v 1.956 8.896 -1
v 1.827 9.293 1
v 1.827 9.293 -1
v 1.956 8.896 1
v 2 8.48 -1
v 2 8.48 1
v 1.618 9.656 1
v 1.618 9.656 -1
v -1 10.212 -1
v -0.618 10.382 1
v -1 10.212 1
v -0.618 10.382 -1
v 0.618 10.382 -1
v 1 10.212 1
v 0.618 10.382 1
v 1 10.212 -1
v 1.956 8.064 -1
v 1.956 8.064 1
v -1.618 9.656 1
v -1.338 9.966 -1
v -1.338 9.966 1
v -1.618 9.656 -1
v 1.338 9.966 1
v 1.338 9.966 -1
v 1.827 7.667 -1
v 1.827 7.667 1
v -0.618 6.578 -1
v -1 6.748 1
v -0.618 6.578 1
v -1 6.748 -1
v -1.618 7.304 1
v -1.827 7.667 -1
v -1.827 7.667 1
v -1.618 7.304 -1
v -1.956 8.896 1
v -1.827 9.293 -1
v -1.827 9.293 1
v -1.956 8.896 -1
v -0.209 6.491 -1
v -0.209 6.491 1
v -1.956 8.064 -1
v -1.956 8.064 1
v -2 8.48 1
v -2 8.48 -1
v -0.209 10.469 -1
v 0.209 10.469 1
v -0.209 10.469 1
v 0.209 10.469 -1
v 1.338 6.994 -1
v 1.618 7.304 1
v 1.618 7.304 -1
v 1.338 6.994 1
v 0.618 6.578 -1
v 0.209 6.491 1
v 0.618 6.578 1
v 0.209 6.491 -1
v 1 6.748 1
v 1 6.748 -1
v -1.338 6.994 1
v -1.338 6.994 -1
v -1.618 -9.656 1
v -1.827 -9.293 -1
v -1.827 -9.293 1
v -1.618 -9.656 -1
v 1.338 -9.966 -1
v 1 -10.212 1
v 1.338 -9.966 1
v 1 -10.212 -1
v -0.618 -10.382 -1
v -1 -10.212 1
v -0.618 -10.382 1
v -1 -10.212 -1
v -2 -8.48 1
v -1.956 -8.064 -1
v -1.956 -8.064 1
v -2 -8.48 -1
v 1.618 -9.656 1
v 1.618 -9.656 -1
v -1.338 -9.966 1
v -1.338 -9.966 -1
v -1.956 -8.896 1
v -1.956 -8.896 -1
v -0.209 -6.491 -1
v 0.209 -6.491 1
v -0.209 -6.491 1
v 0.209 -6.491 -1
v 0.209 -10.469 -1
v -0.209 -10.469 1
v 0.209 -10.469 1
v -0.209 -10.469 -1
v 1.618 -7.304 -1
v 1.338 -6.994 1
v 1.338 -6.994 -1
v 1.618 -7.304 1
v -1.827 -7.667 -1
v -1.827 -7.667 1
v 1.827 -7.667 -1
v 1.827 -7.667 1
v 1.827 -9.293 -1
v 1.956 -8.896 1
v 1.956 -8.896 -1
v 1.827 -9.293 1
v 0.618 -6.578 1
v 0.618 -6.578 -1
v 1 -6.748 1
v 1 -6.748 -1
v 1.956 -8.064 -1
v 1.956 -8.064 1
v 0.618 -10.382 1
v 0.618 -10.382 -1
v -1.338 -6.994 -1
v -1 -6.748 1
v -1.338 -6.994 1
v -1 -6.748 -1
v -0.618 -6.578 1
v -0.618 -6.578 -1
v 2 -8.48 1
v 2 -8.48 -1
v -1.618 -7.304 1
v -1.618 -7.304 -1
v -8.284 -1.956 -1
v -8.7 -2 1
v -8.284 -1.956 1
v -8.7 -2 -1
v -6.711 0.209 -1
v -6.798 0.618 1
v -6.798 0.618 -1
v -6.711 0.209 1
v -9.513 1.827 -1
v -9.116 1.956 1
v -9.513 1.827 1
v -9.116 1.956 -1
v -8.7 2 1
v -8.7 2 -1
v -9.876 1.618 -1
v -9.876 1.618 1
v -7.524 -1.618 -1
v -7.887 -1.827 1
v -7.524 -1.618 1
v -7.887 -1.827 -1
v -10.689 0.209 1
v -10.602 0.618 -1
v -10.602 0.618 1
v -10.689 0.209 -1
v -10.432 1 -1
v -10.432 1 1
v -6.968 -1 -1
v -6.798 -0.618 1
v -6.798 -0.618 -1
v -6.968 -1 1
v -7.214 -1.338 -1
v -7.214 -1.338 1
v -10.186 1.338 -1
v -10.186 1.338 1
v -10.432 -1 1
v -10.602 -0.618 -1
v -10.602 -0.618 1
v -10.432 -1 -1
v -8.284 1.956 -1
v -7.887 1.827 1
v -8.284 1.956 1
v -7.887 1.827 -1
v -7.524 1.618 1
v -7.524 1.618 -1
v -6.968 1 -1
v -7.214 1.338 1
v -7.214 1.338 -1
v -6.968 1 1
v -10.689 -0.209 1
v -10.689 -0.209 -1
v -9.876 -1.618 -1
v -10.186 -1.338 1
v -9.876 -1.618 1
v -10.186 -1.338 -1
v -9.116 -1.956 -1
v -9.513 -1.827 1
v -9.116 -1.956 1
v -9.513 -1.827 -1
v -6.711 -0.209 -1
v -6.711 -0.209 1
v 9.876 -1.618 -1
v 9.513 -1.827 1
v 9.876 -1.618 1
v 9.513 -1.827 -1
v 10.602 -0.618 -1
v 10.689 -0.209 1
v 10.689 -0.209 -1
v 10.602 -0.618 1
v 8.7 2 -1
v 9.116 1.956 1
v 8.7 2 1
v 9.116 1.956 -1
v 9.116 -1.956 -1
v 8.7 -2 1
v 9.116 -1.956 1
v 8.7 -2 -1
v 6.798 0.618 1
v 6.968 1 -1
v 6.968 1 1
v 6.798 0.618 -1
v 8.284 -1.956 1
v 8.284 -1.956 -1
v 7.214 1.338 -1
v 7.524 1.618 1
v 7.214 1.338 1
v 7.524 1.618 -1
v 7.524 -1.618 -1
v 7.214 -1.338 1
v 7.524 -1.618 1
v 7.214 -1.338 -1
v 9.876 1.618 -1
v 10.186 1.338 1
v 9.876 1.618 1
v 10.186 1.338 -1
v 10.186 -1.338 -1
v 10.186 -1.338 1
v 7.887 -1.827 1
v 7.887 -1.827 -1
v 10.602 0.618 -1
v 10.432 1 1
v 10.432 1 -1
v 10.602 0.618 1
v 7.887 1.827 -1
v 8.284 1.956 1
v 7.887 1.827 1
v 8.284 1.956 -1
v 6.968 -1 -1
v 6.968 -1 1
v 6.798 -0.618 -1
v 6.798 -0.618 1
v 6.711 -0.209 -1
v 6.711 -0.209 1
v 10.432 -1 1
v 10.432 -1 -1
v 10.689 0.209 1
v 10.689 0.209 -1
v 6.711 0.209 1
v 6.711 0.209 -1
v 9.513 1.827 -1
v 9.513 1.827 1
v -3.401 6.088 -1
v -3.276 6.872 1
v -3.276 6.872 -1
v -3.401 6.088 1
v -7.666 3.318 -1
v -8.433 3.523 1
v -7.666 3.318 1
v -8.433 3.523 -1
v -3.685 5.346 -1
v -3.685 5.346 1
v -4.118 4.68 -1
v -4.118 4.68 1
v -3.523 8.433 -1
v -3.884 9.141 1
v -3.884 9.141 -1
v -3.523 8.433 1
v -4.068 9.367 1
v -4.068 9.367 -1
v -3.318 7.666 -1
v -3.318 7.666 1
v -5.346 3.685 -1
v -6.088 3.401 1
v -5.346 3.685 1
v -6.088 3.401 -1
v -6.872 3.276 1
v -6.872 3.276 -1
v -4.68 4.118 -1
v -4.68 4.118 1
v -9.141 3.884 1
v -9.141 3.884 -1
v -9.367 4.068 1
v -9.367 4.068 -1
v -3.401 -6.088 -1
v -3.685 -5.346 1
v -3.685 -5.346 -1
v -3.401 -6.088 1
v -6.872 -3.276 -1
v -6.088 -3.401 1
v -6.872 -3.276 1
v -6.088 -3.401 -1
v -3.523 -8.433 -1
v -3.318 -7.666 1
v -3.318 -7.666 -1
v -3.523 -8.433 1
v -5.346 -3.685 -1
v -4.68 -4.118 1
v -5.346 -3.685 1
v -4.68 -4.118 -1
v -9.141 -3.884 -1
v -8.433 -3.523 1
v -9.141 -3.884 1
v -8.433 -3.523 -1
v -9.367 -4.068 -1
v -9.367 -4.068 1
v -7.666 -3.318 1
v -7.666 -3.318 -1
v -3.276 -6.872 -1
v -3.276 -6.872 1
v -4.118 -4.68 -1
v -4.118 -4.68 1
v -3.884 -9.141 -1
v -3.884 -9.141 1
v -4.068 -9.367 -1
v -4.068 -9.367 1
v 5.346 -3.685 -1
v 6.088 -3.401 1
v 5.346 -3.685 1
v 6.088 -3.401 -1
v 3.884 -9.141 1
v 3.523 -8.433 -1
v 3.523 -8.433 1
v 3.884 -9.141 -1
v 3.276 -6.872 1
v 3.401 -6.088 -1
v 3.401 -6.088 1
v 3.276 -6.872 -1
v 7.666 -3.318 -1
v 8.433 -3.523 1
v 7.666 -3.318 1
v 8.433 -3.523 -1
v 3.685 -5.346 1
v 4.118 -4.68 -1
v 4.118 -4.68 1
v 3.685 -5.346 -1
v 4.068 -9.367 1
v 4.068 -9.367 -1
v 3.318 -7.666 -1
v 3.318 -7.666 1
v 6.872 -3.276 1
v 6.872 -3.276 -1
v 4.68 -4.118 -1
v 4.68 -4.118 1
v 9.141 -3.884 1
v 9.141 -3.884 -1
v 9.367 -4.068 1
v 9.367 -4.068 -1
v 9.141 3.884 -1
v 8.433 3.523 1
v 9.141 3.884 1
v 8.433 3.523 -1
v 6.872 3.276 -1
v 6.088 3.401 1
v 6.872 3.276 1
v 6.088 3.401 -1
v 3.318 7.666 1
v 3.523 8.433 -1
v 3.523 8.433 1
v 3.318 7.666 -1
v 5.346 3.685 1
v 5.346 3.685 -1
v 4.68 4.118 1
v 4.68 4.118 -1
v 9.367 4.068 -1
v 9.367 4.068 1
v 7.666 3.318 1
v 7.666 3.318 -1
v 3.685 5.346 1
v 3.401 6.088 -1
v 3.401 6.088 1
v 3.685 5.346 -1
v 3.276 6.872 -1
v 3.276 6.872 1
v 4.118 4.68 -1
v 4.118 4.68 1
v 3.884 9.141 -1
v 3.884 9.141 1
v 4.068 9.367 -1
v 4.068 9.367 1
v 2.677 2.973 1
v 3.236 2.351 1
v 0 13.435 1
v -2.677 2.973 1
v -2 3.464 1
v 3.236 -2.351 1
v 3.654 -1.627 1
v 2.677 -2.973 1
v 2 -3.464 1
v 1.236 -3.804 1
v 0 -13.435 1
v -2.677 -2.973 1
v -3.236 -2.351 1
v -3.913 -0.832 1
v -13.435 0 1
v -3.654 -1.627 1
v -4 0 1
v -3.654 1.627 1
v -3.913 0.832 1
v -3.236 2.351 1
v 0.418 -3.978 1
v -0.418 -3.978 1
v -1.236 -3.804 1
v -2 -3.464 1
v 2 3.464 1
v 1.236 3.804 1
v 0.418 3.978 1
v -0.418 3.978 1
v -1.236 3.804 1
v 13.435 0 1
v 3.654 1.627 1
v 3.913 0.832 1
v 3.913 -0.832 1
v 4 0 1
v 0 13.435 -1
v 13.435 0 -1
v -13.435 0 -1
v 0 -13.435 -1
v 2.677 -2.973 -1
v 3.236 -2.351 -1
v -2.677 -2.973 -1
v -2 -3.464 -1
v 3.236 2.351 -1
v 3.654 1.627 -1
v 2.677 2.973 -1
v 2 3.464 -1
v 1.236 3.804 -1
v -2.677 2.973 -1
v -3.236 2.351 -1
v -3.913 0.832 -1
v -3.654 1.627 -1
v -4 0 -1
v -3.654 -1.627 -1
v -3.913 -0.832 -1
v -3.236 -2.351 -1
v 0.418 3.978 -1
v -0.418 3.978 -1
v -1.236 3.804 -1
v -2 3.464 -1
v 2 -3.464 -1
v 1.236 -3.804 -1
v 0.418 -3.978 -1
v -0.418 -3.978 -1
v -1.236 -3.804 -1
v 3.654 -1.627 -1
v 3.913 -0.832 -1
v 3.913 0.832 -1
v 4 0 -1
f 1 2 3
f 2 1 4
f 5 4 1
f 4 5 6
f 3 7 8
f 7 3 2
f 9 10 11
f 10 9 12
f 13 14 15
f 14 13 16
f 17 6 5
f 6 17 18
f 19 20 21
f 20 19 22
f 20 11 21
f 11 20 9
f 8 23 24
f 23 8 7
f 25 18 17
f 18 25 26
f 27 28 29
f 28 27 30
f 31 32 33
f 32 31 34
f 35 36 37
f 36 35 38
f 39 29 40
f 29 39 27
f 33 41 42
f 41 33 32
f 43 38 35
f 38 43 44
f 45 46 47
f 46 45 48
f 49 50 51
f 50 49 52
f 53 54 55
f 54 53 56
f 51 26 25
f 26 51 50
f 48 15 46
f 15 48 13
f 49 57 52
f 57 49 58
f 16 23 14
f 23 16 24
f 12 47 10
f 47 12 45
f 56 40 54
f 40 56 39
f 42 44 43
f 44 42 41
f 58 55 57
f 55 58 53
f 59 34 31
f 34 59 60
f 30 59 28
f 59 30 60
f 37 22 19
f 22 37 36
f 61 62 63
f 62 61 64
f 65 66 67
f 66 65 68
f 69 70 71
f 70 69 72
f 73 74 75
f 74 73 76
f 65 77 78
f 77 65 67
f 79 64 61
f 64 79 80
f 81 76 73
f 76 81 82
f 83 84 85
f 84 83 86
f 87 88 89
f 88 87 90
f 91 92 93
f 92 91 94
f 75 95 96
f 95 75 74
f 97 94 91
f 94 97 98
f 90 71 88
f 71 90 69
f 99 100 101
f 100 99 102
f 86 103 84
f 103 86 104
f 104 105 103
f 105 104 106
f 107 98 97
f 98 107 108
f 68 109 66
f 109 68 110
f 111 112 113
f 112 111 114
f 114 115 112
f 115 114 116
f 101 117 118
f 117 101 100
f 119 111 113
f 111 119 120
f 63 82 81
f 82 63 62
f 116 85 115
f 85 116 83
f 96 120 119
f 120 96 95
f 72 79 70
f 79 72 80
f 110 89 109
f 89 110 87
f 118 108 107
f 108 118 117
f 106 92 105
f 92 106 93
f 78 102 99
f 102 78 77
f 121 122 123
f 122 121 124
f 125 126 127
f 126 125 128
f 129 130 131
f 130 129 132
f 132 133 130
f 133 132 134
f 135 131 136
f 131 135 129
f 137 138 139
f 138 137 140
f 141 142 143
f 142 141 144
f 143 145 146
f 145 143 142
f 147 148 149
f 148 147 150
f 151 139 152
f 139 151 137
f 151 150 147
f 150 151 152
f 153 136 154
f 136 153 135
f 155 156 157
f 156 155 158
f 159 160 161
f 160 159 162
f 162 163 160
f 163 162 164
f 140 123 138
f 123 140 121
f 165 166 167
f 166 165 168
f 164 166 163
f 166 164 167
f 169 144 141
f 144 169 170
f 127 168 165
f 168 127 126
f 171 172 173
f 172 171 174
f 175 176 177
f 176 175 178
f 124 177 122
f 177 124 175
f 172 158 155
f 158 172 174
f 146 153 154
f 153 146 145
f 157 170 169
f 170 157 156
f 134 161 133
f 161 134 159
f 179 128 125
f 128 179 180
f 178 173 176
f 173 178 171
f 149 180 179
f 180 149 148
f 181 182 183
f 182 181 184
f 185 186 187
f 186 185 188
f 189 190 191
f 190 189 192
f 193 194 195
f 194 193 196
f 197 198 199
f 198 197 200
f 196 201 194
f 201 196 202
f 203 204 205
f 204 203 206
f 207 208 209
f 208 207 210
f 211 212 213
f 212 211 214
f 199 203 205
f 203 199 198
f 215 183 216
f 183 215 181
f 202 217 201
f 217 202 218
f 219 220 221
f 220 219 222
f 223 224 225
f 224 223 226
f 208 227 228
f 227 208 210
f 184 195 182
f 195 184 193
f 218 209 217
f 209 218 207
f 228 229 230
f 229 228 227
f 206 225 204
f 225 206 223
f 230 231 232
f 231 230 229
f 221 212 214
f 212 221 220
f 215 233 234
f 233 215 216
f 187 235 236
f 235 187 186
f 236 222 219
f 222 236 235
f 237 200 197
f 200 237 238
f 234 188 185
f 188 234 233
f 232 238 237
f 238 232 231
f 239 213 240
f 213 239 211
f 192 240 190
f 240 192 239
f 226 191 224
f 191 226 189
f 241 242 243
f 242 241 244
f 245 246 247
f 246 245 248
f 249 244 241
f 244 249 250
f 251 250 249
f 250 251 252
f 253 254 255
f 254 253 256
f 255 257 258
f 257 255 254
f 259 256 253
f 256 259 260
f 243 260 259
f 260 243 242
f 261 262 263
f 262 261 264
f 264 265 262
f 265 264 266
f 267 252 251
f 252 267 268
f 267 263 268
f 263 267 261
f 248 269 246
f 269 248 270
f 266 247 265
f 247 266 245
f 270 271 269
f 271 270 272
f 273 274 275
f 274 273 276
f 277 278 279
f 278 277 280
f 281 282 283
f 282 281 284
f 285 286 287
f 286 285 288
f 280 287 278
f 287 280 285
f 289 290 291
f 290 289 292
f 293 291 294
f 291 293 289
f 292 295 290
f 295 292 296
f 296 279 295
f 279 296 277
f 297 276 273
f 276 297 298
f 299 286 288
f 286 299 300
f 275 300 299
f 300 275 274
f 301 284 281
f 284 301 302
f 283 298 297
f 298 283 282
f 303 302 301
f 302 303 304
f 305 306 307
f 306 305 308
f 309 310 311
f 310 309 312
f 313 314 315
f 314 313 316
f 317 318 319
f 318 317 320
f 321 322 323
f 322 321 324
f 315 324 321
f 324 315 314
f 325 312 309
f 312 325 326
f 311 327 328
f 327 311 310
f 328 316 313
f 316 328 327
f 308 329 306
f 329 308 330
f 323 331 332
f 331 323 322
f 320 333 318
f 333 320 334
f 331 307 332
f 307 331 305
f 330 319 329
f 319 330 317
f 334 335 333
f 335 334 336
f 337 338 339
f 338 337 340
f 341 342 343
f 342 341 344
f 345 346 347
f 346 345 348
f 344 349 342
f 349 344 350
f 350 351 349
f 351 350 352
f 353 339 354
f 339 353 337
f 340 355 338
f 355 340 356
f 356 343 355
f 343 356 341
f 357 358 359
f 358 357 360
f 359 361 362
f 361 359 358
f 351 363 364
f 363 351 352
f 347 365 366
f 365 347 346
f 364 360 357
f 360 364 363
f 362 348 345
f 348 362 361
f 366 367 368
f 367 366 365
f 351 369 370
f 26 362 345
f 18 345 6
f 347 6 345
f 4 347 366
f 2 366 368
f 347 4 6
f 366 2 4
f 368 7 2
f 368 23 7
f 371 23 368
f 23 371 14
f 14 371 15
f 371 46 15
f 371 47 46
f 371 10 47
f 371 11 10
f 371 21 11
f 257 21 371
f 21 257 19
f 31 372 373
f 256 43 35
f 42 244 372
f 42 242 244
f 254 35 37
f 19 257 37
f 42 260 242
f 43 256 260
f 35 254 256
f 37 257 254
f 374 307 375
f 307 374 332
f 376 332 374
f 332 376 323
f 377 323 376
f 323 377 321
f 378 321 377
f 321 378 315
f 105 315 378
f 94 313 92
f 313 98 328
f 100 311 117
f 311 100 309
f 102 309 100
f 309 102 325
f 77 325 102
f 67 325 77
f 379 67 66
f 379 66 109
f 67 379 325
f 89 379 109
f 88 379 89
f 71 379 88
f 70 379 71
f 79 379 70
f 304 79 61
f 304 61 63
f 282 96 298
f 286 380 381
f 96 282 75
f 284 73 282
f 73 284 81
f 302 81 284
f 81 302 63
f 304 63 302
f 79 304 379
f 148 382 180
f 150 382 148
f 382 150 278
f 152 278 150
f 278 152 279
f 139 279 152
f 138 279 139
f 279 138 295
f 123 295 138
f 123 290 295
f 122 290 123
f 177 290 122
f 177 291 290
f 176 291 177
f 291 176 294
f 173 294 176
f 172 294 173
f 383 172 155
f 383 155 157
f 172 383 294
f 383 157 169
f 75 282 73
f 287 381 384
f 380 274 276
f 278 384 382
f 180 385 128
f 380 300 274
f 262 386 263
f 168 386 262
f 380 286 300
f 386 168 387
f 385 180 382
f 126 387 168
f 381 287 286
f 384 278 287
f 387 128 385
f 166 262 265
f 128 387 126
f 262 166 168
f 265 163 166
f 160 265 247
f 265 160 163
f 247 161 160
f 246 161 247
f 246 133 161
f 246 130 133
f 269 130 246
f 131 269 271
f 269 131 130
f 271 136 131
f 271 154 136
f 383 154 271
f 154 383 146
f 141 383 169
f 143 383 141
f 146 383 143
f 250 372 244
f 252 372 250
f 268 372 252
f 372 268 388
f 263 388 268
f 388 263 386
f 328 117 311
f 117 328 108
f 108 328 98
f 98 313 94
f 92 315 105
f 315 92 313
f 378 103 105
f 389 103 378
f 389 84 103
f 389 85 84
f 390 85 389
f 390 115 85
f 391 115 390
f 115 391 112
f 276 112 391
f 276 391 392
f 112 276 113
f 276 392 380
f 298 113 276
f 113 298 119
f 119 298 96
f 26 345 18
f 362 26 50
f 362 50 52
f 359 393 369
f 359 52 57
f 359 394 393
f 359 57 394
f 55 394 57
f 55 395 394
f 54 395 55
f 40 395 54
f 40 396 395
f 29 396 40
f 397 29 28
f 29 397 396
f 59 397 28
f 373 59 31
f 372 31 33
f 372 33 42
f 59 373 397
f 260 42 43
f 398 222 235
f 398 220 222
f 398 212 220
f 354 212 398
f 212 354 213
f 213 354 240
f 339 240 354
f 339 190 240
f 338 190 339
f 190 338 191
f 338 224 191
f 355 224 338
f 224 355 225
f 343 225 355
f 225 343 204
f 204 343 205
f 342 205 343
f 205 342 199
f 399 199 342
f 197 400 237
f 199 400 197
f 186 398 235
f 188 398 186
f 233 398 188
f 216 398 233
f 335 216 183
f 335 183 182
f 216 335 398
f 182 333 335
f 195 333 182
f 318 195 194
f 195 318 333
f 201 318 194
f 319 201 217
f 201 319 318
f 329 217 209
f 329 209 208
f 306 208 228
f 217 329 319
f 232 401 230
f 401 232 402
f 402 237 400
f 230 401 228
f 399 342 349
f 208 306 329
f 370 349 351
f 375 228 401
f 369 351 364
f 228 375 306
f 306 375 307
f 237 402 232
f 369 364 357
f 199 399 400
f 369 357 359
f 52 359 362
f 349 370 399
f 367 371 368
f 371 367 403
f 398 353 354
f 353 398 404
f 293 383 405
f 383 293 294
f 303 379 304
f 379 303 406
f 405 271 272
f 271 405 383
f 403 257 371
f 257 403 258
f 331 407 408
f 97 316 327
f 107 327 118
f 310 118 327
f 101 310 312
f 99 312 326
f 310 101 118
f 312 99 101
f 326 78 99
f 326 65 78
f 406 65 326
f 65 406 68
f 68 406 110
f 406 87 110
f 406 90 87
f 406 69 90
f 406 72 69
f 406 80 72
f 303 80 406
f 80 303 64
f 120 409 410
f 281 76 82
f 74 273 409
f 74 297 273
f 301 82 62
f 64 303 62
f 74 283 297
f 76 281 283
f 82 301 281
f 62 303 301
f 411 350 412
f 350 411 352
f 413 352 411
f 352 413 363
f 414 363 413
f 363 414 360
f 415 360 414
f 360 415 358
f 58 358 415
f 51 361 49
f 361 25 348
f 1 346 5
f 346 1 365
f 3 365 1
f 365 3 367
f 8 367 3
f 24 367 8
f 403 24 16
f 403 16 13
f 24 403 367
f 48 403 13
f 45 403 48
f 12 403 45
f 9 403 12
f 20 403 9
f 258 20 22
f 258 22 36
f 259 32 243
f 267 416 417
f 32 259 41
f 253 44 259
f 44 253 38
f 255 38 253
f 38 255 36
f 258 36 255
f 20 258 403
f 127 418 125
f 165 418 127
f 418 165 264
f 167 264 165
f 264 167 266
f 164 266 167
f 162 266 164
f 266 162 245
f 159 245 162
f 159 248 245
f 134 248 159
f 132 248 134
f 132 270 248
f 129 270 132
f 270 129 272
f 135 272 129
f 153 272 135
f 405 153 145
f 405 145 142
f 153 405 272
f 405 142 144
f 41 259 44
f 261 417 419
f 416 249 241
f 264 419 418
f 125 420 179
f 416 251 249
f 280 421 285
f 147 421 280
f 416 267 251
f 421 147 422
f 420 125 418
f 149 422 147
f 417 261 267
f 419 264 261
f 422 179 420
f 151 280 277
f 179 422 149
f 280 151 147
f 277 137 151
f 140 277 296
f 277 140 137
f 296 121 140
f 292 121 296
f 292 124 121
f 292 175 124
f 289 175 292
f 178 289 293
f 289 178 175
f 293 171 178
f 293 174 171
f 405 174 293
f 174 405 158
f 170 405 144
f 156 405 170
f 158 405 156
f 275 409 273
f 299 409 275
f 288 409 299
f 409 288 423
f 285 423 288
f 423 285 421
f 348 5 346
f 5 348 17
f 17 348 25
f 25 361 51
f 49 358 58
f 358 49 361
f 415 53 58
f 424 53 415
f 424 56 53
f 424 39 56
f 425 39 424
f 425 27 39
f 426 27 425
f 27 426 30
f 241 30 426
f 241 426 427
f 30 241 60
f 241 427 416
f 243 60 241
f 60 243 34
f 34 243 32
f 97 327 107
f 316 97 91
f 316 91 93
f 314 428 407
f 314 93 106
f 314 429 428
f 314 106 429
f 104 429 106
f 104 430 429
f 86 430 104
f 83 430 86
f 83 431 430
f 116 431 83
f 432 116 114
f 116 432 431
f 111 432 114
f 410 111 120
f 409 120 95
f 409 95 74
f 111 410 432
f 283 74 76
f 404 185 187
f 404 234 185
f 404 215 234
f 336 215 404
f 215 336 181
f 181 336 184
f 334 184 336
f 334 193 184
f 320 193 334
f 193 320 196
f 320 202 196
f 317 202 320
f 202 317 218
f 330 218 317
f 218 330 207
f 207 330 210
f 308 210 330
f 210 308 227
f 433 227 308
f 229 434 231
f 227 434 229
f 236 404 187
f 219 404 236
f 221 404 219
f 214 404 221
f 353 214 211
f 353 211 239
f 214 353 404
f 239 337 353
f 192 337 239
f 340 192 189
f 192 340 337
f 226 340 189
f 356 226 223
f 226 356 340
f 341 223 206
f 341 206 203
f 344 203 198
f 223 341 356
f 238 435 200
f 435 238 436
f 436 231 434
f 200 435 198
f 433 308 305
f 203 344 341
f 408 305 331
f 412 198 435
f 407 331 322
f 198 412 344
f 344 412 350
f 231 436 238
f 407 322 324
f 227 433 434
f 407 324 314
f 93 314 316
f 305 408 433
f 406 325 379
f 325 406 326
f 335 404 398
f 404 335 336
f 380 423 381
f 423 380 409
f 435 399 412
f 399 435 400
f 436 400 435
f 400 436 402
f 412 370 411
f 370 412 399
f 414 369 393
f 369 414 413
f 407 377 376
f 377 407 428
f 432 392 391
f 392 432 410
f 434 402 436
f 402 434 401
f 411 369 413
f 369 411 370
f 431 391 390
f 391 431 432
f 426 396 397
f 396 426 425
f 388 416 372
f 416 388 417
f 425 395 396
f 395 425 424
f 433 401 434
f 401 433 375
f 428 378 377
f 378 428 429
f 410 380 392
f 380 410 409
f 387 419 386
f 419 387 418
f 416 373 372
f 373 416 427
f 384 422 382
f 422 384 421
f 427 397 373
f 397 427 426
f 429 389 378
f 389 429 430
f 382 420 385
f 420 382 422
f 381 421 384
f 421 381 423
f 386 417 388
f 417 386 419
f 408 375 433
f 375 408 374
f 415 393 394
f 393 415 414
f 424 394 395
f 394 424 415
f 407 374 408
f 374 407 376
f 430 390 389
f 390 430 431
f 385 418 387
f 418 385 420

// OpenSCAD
$fn=30;

//wheelMount();
motorMount();

module motorMount()
{
    screwRadius=2;
    difference()
    {
        union()
        {
            rotate([0,0,45]) cube([19,19, 2], center=true);
        }
        for (h =[0:180:360])
        {
            rotate([0,0,h]) translate([0,8.48,0]) cylinder(r=screwRadius, h=3, center=true);
        }
        
        for (h =[90:180:430])
        {
            rotate([0,0,h]) translate([0,8.7,0]) cylinder(r=screwRadius, h=3, center=true);
        }
        
        for (h =[45:90:405])
        {
            rotate([0,0,h]) translate([0,10,0]) cylinder(r=3.8, h=3, center=true);
        }
        
        cylinder(r=4, h=3, center=true);
    }
    

}


module wheelMount()
{
    screwRadius=1;
    plugRadius=1.8;
    difference()
    {
        union(){
            cylinder(r=11.4, h=1.8, center=true);
            translate([0,0,3.5]) cylinder(r=2.65, h=8, center=true);
           
        }
        translate([0,11.8,11]) cube([20,20,20], center=true);
        translate([0,-11.8,11]) cube([20,20,20], center=true);
     
        for (h =[0:90:360])
        {
            rotate([0,0,h]) translate([0,6,0]) cylinder(r=screwRadius/1.2, r2=screwRadius*2, h=2, center=true);
        }
    
        //translate([0,6,0]) cylinder(r=screwRadius/1.2, r2=screwRadius*2, h=2, center=true);
        //translate([0,-6,0]) cylinder(r=screwRadius/1.2, r2=screwRadius*2, h=2, center=true);
        //translate([6,0,0]) cylinder(r=screwRadius/1.2, r2=screwRadius*2, h=2, center=true);
        //translate([-6,0,0]) cylinder(r=screwRadius/1.2, r2=screwRadius*2, h=2, center=true);
        
    }
    
    for (a =[22.5:45:382.5])
    {
        rotate([0,0,a]) translate([-9.5,0,-1.5]) cylinder(r=plugRadius, h=2, center=true);
    }  
    
}
